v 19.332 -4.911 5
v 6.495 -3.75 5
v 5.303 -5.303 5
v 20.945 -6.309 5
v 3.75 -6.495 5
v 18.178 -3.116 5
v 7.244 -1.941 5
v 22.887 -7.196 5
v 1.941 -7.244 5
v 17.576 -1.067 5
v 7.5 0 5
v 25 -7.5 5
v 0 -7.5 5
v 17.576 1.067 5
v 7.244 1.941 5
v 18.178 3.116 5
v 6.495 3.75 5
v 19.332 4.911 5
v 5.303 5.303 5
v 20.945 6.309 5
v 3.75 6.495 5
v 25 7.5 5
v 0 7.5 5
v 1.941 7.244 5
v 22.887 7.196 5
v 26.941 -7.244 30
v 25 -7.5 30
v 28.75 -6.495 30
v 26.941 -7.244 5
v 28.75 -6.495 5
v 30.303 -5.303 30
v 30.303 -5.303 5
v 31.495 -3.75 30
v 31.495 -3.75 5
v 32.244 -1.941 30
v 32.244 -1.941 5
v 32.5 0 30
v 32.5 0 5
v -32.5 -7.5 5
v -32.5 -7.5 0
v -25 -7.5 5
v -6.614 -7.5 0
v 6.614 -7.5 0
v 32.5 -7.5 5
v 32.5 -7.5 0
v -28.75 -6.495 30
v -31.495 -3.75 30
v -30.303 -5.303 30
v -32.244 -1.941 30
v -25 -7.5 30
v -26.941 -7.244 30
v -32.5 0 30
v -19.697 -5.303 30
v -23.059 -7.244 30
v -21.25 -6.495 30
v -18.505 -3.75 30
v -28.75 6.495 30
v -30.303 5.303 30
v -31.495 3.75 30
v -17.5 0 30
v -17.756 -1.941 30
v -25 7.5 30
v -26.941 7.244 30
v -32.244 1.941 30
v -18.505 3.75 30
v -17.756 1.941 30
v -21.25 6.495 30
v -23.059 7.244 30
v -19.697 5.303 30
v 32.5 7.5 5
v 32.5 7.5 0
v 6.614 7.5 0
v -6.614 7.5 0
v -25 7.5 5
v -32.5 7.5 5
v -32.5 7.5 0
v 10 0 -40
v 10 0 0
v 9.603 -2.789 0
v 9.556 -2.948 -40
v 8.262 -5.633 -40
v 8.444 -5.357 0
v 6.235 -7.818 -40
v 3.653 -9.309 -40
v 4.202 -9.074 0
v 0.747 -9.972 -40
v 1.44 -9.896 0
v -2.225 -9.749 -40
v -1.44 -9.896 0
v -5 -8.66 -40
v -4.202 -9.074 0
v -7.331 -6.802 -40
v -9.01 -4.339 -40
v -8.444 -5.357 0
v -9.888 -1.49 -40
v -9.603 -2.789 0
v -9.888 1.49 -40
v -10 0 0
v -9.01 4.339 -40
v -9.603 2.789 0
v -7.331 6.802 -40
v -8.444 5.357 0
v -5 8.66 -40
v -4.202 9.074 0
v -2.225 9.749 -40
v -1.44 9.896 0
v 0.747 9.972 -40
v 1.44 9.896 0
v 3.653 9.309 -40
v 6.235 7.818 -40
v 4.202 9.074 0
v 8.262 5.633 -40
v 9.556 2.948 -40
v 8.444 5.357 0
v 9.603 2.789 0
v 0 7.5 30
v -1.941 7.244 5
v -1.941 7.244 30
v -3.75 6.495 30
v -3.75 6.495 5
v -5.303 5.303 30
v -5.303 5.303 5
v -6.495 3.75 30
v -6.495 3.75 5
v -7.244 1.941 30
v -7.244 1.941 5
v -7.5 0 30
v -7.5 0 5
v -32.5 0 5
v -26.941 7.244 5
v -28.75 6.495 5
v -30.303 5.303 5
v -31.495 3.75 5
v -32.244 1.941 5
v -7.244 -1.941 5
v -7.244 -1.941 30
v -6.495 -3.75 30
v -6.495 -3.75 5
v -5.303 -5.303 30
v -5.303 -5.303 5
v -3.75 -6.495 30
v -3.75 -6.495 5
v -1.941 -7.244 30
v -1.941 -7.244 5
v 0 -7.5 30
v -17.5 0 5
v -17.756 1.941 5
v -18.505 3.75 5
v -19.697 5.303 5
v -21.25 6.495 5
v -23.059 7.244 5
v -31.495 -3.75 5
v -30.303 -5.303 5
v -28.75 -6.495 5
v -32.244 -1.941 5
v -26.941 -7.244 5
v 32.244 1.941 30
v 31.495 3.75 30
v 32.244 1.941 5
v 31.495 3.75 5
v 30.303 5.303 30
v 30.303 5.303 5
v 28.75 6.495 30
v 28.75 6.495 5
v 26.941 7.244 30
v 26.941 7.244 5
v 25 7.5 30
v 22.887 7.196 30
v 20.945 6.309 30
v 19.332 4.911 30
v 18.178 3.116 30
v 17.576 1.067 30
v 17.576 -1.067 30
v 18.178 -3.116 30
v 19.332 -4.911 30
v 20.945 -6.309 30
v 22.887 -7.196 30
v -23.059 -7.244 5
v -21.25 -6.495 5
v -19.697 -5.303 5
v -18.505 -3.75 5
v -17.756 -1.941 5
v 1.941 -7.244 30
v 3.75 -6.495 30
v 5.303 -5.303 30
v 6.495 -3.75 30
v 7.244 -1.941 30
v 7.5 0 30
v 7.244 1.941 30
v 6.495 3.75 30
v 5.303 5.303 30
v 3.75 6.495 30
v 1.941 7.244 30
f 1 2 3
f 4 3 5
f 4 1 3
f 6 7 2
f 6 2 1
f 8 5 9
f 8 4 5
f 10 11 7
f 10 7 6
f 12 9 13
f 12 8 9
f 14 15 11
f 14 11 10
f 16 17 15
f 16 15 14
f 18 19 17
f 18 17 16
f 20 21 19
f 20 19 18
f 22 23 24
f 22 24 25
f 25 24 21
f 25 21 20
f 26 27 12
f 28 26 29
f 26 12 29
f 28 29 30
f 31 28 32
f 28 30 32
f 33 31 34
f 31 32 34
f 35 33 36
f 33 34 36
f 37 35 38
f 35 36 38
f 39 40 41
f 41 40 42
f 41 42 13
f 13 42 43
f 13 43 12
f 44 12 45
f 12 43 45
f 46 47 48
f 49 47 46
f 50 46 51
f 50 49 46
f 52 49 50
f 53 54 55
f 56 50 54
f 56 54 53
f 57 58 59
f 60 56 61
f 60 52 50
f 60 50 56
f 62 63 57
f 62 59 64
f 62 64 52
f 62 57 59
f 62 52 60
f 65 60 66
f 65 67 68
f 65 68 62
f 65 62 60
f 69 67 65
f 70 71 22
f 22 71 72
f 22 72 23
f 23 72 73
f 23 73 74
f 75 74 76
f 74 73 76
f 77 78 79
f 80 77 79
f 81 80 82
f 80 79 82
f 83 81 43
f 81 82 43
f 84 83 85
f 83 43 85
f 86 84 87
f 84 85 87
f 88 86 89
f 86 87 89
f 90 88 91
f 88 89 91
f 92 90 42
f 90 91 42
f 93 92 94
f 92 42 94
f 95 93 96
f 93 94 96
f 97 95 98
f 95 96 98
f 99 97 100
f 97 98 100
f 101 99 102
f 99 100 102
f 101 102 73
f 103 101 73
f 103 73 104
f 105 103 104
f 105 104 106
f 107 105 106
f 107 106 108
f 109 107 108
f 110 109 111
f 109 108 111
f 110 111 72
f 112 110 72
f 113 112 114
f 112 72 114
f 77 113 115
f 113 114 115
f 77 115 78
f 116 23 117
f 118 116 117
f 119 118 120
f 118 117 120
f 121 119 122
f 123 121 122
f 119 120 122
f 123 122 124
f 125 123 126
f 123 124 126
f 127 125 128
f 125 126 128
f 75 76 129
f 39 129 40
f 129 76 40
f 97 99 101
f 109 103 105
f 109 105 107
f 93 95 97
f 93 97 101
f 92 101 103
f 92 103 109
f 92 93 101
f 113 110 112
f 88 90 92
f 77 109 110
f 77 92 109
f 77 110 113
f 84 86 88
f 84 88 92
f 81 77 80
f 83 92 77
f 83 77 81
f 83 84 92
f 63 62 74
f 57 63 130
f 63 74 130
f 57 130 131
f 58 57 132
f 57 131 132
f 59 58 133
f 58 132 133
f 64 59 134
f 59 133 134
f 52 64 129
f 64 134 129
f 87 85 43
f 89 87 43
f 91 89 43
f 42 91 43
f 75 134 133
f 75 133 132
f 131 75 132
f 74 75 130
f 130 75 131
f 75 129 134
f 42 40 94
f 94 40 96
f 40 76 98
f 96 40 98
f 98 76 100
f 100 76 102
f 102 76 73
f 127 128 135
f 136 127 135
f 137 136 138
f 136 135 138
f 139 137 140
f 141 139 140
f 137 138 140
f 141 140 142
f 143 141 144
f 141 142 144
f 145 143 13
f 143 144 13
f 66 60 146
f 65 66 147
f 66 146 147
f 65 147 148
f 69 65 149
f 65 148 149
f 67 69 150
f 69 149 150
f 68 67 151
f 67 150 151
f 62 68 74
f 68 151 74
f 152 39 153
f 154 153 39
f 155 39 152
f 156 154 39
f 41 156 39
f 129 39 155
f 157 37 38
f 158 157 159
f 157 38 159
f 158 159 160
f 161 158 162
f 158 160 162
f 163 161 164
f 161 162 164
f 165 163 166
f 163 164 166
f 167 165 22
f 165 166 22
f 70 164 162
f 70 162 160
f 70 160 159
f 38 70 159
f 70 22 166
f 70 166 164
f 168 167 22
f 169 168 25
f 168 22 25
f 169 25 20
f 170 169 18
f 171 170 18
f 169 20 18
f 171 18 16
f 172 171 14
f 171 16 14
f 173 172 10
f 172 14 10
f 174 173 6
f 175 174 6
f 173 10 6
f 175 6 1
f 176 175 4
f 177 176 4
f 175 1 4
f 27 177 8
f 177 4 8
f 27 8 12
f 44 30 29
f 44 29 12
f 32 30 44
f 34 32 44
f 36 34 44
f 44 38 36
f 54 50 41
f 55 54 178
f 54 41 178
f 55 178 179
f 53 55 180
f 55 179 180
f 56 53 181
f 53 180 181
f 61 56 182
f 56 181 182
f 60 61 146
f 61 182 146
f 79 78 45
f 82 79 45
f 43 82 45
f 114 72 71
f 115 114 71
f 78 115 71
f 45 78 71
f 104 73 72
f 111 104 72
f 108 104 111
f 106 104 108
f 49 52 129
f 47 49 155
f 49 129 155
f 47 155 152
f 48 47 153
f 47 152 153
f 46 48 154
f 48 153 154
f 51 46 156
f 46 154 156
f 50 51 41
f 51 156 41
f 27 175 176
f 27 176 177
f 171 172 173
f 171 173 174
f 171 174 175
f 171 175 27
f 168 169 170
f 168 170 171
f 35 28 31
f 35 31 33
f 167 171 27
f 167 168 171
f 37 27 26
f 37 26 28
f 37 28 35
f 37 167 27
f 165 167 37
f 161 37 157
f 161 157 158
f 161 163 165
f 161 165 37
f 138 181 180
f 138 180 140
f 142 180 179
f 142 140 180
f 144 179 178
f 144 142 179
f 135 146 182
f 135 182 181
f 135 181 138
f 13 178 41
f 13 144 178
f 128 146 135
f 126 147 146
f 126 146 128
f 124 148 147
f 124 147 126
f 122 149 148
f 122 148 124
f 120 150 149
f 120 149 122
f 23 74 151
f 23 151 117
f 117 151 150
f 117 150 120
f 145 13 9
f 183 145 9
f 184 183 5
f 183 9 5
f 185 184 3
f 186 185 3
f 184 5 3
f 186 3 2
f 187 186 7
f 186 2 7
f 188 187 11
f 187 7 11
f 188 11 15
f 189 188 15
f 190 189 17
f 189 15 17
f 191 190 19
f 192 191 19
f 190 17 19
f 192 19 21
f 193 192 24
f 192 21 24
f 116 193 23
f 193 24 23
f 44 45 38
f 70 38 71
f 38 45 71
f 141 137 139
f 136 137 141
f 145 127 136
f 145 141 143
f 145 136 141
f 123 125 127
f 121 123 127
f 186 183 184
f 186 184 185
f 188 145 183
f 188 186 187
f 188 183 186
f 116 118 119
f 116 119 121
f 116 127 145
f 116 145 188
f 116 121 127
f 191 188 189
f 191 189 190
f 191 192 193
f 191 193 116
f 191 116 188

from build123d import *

# Parameters (mm, degrees)
F1_DEPTH = 5
F2_DEPTH = 30
F3_DEPTH = 30
F4_DEPTH = 30
F5_R     = 10
F6_DEPTH = 40


with BuildPart() as f1:
    # F0 (on Top) → F1 (new body)
    with BuildSketch(Plane.XY):
        with BuildLine():
            Line((32.5, 0), (32.5, 7.5))
            Line((32.5, 7.5), (25, 7.5))
            ThreePointArc((25, 7.5), (30.303301, 5.303301), (32.5, 0))
        make_face()
        with BuildLine():
            ThreePointArc((25, -7.5), (17.5, 0), (25, 7.5))
            Line((25, 7.5), (0, 7.5))
            ThreePointArc((0, 7.5), (5.303301, 5.303301), (7.5, 0))
            ThreePointArc((7.5, 0), (5.303301, -5.303301), (0, -7.5))
            Line((0, -7.5), (25, -7.5))
        make_face()
        with BuildLine():
            Line((32.5, -7.5), (32.5, 0))
            ThreePointArc((32.5, 0), (30.303301, -5.303301), (25, -7.5))
            Line((25, -7.5), (32.5, -7.5))
        make_face()
        with BuildLine():
            ThreePointArc((-7.5, 0), (-5.303301, 5.303301), (0, 7.5))
            Line((0, 7.5), (-25, 7.5))
            ThreePointArc((-25, 7.5), (-19.696699, 5.303301), (-17.5, 0))
            Line((-17.5, 0), (-7.5, 0))
        make_face()
        with BuildLine():
            ThreePointArc((-32.5, 0), (-30.303301, 5.303301), (-25, 7.5))
            Line((-25, 7.5), (-32.5, 7.5))
            Line((-32.5, 7.5), (-32.5, 0))
        make_face()
        with BuildLine():
            ThreePointArc((0, -7.5), (-5.303301, -5.303301), (-7.5, 0))
            Line((-7.5, 0), (-17.5, 0))
            ThreePointArc((-17.5, 0), (-19.696699, -5.303301), (-25, -7.5))
            Line((-25, -7.5), (0, -7.5))
        make_face()
        with BuildLine():
            ThreePointArc((-25, -7.5), (-30.303301, -5.303301), (-32.5, 0))
            Line((-32.5, 0), (-32.5, -7.5))
            Line((-32.5, -7.5), (-25, -7.5))
        make_face()
    extrude(amount=F1_DEPTH)

    # F0 (on Top) → F2 (join)
    with BuildSketch(Plane.XY):
        with BuildLine():
            ThreePointArc((-17.5, 0), (-19.696699, 5.303301), (-25, 7.5))
            ThreePointArc((-25, 7.5), (-30.303301, 5.303301), (-32.5, 0))
            ThreePointArc((-32.5, 0), (-30.303301, -5.303301), (-25, -7.5))
            ThreePointArc((-25, -7.5), (-19.696699, -5.303301), (-17.5, 0))
        make_face()
    extrude(amount=F2_DEPTH)

    # F0 (on Top) → F3 (join)
    with BuildSketch(Plane.XY):
        with BuildLine():
            ThreePointArc((7.5, 0), (5.303301, 5.303301), (0, 7.5))
            ThreePointArc((0, 7.5), (-5.303301, 5.303301), (-7.5, 0))
            ThreePointArc((-7.5, 0), (-5.303301, -5.303301), (0, -7.5))
            ThreePointArc((0, -7.5), (5.303301, -5.303301), (7.5, 0))
        make_face()
    extrude(amount=F3_DEPTH)

    # F0 (on Top) → F4 (join)
    with BuildSketch(Plane.XY):
        with BuildLine():
            ThreePointArc((32.5, 0), (30.303301, 5.303301), (25, 7.5))
            ThreePointArc((25, 7.5), (17.5, 0), (25, -7.5))
            ThreePointArc((25, -7.5), (30.303301, -5.303301), (32.5, 0))
        make_face()
    extrude(amount=F4_DEPTH)

    # F5 (on face) → F6 (join)
    with BuildSketch(Plane(origin=(0, 0, 0), x_dir=(1, 0, 0), z_dir=(0, 0, -1))):
        Circle(F5_R)
    extrude(amount=F6_DEPTH)


solid = f1.part
